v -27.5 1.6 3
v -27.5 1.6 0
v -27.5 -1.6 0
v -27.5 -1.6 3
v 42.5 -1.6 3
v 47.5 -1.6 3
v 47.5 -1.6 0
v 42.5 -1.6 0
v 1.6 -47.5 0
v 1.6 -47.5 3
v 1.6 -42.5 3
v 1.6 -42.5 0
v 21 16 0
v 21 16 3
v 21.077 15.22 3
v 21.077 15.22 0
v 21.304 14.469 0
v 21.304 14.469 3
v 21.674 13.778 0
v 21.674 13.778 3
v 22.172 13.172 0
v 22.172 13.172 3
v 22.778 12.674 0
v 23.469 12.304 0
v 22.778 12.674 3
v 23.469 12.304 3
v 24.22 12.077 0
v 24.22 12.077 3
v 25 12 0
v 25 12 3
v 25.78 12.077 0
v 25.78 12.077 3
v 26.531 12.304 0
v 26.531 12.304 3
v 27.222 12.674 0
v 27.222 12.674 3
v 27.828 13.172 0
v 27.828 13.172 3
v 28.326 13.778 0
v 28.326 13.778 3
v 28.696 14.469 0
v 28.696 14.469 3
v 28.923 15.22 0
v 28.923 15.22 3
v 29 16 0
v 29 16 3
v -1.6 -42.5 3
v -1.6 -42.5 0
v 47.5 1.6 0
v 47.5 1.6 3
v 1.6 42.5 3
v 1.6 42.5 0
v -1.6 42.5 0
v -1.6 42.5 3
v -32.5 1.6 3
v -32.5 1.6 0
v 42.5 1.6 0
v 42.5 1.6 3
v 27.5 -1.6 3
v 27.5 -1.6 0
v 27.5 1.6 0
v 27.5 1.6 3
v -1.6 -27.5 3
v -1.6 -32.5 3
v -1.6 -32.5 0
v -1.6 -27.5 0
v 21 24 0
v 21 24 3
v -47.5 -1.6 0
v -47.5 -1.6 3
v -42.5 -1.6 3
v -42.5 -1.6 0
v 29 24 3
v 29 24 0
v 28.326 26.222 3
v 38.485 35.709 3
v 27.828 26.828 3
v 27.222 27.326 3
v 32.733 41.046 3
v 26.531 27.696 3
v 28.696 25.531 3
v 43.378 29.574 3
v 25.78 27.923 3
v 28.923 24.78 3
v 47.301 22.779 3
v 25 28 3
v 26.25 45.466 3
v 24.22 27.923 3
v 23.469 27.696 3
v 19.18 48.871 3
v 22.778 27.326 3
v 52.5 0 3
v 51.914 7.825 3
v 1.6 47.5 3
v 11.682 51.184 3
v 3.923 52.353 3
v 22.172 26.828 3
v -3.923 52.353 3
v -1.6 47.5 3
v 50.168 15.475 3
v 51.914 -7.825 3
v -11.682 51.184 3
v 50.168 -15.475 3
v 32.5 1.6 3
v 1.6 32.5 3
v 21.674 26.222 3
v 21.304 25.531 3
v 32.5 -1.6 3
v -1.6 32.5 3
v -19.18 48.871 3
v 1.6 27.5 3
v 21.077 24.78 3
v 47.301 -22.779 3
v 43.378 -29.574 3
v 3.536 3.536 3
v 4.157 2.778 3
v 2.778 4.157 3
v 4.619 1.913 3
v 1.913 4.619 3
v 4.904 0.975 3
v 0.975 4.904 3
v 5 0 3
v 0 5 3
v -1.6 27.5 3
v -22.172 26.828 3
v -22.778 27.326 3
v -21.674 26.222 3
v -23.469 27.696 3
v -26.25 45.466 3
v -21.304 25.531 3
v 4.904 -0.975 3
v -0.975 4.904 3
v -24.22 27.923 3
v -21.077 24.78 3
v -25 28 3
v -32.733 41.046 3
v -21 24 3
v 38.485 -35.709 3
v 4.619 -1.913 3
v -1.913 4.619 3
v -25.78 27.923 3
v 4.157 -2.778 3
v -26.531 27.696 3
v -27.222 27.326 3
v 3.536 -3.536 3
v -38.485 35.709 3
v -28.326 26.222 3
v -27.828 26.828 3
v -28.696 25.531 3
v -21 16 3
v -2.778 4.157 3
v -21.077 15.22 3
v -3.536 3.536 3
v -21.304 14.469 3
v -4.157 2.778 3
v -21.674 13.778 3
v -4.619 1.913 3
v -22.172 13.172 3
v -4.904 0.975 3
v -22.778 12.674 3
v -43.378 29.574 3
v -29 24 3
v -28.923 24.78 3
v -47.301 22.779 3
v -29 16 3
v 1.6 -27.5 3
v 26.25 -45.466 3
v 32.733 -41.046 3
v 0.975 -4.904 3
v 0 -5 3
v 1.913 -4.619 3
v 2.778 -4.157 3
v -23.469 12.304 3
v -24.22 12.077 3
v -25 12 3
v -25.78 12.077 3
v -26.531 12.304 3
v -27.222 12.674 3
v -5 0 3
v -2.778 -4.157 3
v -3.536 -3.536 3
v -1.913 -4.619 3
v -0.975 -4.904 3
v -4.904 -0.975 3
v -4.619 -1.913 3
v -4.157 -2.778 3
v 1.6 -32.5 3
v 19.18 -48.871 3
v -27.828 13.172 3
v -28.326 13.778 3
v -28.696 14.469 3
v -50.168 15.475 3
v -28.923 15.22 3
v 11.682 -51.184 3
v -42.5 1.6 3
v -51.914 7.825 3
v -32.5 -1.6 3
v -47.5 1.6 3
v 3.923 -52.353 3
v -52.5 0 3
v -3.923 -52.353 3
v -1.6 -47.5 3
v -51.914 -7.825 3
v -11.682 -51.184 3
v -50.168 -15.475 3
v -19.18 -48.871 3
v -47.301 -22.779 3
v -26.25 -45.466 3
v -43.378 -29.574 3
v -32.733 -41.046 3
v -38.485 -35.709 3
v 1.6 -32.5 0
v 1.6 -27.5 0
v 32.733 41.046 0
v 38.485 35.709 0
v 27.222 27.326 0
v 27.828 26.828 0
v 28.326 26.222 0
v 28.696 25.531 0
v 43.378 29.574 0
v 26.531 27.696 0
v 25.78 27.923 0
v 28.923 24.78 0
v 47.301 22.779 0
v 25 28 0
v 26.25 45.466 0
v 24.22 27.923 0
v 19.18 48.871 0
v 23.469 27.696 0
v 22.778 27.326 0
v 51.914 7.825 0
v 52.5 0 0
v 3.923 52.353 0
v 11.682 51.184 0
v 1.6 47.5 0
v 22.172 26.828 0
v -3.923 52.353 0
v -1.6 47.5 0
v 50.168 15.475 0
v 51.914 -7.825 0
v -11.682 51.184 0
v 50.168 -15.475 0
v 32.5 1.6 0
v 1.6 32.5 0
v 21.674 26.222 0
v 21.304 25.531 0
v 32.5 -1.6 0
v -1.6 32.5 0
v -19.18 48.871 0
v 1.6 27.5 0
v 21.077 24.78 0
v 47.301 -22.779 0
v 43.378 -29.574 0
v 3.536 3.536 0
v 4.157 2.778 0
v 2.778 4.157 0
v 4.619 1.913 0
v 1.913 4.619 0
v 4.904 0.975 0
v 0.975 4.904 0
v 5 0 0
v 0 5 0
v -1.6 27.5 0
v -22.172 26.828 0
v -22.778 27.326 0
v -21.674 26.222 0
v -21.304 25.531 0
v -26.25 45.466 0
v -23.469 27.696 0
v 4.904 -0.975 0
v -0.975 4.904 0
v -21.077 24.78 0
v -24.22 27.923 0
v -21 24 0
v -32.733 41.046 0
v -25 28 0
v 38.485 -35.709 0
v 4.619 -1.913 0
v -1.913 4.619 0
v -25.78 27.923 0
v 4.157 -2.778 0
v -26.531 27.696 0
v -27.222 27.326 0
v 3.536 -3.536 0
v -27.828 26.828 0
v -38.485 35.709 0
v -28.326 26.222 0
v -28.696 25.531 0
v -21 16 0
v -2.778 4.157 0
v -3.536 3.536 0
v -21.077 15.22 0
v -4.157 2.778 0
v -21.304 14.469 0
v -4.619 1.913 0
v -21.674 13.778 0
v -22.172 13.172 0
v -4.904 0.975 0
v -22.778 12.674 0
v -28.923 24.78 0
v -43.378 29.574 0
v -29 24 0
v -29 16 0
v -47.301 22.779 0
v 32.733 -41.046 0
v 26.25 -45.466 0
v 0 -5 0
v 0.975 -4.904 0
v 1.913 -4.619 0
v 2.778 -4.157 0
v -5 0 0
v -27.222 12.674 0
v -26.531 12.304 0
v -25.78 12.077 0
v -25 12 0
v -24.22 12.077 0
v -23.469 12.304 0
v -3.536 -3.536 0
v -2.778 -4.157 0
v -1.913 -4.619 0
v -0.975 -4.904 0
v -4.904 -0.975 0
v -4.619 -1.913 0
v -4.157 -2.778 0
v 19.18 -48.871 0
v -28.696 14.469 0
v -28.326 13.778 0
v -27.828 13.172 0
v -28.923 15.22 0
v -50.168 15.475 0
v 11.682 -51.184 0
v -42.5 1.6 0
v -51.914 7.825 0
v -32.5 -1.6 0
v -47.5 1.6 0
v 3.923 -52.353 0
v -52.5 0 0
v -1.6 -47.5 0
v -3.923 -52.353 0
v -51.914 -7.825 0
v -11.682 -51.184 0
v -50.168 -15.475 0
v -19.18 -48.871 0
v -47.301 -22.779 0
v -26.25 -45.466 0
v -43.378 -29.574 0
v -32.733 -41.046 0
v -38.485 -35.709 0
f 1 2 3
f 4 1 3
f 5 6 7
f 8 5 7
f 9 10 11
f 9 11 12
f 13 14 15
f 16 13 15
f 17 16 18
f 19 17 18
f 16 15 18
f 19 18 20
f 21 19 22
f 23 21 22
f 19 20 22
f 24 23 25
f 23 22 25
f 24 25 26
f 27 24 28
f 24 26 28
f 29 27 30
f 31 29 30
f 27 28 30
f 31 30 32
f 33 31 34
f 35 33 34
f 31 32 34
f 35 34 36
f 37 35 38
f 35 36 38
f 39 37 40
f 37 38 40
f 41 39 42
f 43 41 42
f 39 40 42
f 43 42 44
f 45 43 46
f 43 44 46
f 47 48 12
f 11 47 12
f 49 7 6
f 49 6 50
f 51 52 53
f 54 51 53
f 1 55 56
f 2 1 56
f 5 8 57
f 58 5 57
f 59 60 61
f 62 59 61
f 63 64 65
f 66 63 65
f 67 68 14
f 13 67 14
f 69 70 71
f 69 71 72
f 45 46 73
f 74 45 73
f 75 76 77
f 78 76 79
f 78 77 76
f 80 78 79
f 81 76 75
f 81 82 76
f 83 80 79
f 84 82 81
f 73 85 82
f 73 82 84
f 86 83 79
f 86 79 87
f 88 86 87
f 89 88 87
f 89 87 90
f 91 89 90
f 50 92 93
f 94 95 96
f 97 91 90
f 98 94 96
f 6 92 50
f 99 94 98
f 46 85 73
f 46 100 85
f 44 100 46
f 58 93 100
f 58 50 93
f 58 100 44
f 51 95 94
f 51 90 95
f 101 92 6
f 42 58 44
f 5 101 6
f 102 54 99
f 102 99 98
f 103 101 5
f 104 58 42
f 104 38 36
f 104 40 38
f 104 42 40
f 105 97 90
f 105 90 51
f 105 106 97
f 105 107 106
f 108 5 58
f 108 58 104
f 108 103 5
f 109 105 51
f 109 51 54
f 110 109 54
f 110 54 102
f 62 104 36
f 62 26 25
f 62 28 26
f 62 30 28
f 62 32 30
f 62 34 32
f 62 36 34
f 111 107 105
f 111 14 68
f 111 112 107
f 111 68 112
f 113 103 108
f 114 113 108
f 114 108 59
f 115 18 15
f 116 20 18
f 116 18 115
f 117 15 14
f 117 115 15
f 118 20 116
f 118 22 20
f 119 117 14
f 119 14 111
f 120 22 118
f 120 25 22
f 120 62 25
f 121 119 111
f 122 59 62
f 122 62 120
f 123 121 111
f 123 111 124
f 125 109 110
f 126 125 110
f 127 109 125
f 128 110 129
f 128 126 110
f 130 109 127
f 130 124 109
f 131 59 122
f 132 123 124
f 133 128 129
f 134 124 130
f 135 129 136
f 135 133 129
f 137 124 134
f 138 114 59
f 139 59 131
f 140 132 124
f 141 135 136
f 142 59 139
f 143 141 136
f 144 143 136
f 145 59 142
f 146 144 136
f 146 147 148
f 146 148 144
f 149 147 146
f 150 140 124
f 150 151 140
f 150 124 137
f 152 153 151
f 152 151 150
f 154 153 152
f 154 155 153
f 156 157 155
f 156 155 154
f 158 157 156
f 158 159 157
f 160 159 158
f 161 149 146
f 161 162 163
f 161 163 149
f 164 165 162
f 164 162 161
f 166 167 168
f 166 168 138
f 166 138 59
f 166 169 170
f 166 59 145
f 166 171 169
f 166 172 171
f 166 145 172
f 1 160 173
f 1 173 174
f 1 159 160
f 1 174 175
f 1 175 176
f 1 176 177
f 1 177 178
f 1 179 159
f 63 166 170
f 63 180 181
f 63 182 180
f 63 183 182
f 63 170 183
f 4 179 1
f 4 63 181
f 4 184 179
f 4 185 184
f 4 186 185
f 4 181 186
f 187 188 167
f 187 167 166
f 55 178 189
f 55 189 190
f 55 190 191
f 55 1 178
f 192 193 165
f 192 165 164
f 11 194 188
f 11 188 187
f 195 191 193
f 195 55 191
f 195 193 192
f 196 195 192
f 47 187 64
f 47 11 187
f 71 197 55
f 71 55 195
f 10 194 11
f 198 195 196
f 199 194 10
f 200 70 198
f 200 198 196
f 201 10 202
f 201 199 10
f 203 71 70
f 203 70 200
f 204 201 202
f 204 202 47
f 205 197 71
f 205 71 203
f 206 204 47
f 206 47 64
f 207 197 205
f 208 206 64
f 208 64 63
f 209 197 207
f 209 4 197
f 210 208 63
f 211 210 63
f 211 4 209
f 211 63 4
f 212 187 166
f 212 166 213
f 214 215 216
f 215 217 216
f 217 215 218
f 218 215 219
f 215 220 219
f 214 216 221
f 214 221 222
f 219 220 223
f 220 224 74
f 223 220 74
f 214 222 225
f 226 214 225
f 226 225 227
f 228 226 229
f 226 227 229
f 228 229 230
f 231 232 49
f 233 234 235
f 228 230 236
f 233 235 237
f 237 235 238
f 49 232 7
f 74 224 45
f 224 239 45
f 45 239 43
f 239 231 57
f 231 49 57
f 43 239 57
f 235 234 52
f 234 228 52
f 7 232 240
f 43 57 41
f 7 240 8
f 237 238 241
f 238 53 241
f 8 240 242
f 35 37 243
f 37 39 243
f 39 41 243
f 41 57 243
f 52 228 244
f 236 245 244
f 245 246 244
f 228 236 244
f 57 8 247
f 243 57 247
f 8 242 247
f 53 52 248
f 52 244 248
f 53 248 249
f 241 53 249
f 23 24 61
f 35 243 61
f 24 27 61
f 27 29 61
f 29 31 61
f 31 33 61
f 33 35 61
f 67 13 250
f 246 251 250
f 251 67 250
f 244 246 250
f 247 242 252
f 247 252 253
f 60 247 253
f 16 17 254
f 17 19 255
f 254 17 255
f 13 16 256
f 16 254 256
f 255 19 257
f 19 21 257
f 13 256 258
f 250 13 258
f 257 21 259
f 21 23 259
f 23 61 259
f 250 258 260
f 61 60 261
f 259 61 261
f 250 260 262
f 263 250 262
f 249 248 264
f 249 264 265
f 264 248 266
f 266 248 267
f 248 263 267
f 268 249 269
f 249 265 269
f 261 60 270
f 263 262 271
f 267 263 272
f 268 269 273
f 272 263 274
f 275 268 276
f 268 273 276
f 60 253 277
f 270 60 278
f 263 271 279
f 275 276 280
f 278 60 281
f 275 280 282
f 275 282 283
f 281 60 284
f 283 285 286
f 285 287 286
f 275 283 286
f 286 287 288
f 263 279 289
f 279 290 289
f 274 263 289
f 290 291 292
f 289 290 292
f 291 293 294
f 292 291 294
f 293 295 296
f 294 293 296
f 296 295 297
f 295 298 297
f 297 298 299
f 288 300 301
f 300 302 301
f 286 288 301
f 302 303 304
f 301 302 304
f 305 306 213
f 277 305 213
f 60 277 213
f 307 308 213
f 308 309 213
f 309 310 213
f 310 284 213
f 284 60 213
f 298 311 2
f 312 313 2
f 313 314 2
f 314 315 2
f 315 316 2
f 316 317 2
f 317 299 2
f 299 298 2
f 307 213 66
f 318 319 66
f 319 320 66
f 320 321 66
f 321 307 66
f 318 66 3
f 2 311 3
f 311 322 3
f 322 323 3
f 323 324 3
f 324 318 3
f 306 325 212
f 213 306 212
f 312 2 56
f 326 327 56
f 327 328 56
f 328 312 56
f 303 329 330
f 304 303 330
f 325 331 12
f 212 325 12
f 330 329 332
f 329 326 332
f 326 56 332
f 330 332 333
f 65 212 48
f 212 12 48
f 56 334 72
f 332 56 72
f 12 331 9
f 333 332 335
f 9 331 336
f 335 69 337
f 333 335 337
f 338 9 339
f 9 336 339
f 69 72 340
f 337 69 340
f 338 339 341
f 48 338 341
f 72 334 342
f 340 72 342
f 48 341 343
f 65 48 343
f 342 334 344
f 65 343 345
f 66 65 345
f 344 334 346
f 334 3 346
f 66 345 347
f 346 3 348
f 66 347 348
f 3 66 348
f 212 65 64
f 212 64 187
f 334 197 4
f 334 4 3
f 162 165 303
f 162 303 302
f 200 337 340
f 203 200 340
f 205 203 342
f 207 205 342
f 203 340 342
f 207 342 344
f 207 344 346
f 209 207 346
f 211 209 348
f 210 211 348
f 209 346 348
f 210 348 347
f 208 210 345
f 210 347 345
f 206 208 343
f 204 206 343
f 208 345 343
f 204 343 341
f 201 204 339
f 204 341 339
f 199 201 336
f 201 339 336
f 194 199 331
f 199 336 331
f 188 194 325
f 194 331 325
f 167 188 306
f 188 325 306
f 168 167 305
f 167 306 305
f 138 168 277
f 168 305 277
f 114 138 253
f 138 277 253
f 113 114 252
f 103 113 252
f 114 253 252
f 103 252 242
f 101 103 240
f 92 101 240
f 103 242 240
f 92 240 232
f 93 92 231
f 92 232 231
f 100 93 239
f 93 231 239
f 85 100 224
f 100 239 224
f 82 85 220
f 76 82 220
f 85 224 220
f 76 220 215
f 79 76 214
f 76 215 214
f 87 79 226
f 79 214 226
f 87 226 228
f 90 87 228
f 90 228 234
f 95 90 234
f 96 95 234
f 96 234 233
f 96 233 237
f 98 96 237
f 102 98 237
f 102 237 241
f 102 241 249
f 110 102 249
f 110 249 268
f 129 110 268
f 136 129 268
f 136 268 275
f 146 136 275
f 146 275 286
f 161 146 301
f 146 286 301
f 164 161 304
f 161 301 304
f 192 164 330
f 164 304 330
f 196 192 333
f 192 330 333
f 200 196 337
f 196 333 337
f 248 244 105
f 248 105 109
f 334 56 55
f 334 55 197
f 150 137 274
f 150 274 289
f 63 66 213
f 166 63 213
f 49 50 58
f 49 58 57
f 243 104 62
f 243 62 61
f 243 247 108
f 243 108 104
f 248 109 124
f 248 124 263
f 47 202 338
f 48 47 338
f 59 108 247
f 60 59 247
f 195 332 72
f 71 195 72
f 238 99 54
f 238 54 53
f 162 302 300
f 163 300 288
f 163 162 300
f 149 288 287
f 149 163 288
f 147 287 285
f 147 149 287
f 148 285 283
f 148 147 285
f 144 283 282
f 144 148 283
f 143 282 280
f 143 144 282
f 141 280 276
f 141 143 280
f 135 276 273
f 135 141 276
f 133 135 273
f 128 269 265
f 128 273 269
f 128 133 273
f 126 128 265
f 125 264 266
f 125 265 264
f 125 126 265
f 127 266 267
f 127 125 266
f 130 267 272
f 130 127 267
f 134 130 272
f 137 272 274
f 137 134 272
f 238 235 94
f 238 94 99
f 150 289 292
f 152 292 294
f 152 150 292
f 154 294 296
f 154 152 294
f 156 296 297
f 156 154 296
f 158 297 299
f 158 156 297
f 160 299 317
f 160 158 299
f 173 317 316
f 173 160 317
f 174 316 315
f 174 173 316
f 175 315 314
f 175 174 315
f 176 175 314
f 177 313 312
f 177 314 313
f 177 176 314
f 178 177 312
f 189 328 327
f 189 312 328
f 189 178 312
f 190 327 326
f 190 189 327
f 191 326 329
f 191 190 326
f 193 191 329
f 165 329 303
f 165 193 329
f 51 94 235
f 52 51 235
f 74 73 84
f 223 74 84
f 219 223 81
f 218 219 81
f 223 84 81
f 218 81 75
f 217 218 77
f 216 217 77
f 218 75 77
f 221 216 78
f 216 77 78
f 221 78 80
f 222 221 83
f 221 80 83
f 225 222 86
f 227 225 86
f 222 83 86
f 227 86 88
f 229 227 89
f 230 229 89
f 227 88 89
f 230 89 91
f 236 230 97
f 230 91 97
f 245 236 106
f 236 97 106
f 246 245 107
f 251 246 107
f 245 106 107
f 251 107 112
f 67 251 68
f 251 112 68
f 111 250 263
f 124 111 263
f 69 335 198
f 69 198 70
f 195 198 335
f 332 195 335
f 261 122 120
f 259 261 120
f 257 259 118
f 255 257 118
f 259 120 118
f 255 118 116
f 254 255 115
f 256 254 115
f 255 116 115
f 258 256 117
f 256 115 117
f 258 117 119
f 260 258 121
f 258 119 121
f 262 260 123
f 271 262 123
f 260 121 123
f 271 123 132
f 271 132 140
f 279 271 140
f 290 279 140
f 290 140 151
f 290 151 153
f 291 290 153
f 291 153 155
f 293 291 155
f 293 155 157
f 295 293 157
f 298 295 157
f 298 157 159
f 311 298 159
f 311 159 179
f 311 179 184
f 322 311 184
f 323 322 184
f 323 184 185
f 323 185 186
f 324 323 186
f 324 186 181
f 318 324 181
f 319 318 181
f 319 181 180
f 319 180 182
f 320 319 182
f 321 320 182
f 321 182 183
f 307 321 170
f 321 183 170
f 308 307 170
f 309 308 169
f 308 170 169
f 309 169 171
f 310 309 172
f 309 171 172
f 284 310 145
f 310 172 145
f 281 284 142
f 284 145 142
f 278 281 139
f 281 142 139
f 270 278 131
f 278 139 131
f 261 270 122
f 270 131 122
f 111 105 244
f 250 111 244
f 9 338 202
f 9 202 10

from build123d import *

# Parameters (mm, degrees)
SKETCH1_R               = 52.5
BOSS_EXTRUDE1_DEPTH     = 3
RIB_START               = -47.5
RIB_SLOT_OUTLINE_W      = 3.2
RIB_SLOT_OUTLINE_H      = 3
RIB_SLOT_DEPTH          = 5
RIB_START_2             = -32.5
RIB_SLOT_2_OUTLINE_W    = 3.2
RIB_SLOT_2_OUTLINE_H    = 3
RIB_SLOT_2_DEPTH        = 5
RIB_SLOT_PATTERN_COUNT  = 4
ANTENNA_CLEARANCE_REACH = 76.307
SKETCH3_R               = 5


# Read off the part's stored shape, not the designer's step: rib slot
with BuildPart() as part:
    # Sketch1 → Boss-Extrude1 (new body)
    with BuildSketch(Plane.XY):
        with Locations(Location((0, 0, 0), (0, 0, 180))):
            Circle(SKETCH1_R)
    extrude(amount=BOSS_EXTRUDE1_DEPTH)

    # rib slot outline → rib slot (cut)
    with BuildSketch(Plane(origin=(0, 0, 0), x_dir=(1, 0, 0), z_dir=(0, 1, 0)).offset(RIB_START)):
        with Locations((0, -1.5)):
            Rectangle(RIB_SLOT_OUTLINE_W, RIB_SLOT_OUTLINE_H)
    rib_slot = extrude(amount=RIB_SLOT_DEPTH, mode=Mode.SUBTRACT)

    # rib slot 2 outline → rib slot 2 (cut)
    with BuildSketch(Plane(origin=(0, 0, 0), x_dir=(1, 0, 0), z_dir=(0, 1, 0)).offset(RIB_START_2)):
        with Locations((0, -1.5)):
            Rectangle(RIB_SLOT_2_OUTLINE_W, RIB_SLOT_2_OUTLINE_H)
    rib_slot_2 = extrude(amount=RIB_SLOT_2_DEPTH, mode=Mode.SUBTRACT)

    # rib slot pattern: rib slot, rib slot 2 ×4 about axis
    rib_slot_pattern_axis = Axis((0, 0, 0), (0, 0, 1))
    add([rib_slot.rotate(rib_slot_pattern_axis, i * 360 / RIB_SLOT_PATTERN_COUNT) for i in range(1, RIB_SLOT_PATTERN_COUNT)], mode=Mode.SUBTRACT)
    add([rib_slot_2.rotate(rib_slot_pattern_axis, i * 360 / RIB_SLOT_PATTERN_COUNT) for i in range(1, RIB_SLOT_PATTERN_COUNT)], mode=Mode.SUBTRACT)

    # Sketch3 → antenna clearance (cut, up to next)
    with BuildSketch(Plane.XY.offset(3), mode=Mode.PRIVATE) as antenna_clearance_sk1:
        Circle(SKETCH3_R)
    antenna_clearance_tool1 = extrude(antenna_clearance_sk1.sketch, amount=-ANTENNA_CLEARANCE_REACH, mode=Mode.PRIVATE) & part.part
    # Sketch3 → antenna clearance (cut, up to next)
    with BuildSketch(Plane.XY.offset(3), mode=Mode.PRIVATE) as antenna_clearance_sk2:
        with BuildLine():
            Line((-21, 24), (-21, 16))
            ThreePointArc((-21, 16), (-25, 12), (-29, 16))
            Line((-29, 16), (-29, 24))
            ThreePointArc((-29, 24), (-25, 28), (-21, 24))
        make_face()
    antenna_clearance_tool2 = extrude(antenna_clearance_sk2.sketch, amount=-ANTENNA_CLEARANCE_REACH, mode=Mode.PRIVATE) & part.part
    # Sketch3 → antenna clearance (cut, up to next)
    with BuildSketch(Plane.XY.offset(3), mode=Mode.PRIVATE) as antenna_clearance_sk3:
        with BuildLine():
            Line((21, 24), (21, 16))
            ThreePointArc((21, 16), (25, 12), (29, 16))
            Line((29, 16), (29, 24))
            ThreePointArc((29, 24), (25, 28), (21, 24))
        make_face()
    antenna_clearance_tool3 = extrude(antenna_clearance_sk3.sketch, amount=-ANTENNA_CLEARANCE_REACH, mode=Mode.PRIVATE) & part.part
    add(antenna_clearance_tool1.solids().sort_by_distance((0, 0, 3))[0], mode=Mode.SUBTRACT)
    add(antenna_clearance_tool2.solids().sort_by_distance((-25, 20, 3))[0], mode=Mode.SUBTRACT)
    add(antenna_clearance_tool3.solids().sort_by_distance((25, 20, 3))[0], mode=Mode.SUBTRACT)


solid = part.part
